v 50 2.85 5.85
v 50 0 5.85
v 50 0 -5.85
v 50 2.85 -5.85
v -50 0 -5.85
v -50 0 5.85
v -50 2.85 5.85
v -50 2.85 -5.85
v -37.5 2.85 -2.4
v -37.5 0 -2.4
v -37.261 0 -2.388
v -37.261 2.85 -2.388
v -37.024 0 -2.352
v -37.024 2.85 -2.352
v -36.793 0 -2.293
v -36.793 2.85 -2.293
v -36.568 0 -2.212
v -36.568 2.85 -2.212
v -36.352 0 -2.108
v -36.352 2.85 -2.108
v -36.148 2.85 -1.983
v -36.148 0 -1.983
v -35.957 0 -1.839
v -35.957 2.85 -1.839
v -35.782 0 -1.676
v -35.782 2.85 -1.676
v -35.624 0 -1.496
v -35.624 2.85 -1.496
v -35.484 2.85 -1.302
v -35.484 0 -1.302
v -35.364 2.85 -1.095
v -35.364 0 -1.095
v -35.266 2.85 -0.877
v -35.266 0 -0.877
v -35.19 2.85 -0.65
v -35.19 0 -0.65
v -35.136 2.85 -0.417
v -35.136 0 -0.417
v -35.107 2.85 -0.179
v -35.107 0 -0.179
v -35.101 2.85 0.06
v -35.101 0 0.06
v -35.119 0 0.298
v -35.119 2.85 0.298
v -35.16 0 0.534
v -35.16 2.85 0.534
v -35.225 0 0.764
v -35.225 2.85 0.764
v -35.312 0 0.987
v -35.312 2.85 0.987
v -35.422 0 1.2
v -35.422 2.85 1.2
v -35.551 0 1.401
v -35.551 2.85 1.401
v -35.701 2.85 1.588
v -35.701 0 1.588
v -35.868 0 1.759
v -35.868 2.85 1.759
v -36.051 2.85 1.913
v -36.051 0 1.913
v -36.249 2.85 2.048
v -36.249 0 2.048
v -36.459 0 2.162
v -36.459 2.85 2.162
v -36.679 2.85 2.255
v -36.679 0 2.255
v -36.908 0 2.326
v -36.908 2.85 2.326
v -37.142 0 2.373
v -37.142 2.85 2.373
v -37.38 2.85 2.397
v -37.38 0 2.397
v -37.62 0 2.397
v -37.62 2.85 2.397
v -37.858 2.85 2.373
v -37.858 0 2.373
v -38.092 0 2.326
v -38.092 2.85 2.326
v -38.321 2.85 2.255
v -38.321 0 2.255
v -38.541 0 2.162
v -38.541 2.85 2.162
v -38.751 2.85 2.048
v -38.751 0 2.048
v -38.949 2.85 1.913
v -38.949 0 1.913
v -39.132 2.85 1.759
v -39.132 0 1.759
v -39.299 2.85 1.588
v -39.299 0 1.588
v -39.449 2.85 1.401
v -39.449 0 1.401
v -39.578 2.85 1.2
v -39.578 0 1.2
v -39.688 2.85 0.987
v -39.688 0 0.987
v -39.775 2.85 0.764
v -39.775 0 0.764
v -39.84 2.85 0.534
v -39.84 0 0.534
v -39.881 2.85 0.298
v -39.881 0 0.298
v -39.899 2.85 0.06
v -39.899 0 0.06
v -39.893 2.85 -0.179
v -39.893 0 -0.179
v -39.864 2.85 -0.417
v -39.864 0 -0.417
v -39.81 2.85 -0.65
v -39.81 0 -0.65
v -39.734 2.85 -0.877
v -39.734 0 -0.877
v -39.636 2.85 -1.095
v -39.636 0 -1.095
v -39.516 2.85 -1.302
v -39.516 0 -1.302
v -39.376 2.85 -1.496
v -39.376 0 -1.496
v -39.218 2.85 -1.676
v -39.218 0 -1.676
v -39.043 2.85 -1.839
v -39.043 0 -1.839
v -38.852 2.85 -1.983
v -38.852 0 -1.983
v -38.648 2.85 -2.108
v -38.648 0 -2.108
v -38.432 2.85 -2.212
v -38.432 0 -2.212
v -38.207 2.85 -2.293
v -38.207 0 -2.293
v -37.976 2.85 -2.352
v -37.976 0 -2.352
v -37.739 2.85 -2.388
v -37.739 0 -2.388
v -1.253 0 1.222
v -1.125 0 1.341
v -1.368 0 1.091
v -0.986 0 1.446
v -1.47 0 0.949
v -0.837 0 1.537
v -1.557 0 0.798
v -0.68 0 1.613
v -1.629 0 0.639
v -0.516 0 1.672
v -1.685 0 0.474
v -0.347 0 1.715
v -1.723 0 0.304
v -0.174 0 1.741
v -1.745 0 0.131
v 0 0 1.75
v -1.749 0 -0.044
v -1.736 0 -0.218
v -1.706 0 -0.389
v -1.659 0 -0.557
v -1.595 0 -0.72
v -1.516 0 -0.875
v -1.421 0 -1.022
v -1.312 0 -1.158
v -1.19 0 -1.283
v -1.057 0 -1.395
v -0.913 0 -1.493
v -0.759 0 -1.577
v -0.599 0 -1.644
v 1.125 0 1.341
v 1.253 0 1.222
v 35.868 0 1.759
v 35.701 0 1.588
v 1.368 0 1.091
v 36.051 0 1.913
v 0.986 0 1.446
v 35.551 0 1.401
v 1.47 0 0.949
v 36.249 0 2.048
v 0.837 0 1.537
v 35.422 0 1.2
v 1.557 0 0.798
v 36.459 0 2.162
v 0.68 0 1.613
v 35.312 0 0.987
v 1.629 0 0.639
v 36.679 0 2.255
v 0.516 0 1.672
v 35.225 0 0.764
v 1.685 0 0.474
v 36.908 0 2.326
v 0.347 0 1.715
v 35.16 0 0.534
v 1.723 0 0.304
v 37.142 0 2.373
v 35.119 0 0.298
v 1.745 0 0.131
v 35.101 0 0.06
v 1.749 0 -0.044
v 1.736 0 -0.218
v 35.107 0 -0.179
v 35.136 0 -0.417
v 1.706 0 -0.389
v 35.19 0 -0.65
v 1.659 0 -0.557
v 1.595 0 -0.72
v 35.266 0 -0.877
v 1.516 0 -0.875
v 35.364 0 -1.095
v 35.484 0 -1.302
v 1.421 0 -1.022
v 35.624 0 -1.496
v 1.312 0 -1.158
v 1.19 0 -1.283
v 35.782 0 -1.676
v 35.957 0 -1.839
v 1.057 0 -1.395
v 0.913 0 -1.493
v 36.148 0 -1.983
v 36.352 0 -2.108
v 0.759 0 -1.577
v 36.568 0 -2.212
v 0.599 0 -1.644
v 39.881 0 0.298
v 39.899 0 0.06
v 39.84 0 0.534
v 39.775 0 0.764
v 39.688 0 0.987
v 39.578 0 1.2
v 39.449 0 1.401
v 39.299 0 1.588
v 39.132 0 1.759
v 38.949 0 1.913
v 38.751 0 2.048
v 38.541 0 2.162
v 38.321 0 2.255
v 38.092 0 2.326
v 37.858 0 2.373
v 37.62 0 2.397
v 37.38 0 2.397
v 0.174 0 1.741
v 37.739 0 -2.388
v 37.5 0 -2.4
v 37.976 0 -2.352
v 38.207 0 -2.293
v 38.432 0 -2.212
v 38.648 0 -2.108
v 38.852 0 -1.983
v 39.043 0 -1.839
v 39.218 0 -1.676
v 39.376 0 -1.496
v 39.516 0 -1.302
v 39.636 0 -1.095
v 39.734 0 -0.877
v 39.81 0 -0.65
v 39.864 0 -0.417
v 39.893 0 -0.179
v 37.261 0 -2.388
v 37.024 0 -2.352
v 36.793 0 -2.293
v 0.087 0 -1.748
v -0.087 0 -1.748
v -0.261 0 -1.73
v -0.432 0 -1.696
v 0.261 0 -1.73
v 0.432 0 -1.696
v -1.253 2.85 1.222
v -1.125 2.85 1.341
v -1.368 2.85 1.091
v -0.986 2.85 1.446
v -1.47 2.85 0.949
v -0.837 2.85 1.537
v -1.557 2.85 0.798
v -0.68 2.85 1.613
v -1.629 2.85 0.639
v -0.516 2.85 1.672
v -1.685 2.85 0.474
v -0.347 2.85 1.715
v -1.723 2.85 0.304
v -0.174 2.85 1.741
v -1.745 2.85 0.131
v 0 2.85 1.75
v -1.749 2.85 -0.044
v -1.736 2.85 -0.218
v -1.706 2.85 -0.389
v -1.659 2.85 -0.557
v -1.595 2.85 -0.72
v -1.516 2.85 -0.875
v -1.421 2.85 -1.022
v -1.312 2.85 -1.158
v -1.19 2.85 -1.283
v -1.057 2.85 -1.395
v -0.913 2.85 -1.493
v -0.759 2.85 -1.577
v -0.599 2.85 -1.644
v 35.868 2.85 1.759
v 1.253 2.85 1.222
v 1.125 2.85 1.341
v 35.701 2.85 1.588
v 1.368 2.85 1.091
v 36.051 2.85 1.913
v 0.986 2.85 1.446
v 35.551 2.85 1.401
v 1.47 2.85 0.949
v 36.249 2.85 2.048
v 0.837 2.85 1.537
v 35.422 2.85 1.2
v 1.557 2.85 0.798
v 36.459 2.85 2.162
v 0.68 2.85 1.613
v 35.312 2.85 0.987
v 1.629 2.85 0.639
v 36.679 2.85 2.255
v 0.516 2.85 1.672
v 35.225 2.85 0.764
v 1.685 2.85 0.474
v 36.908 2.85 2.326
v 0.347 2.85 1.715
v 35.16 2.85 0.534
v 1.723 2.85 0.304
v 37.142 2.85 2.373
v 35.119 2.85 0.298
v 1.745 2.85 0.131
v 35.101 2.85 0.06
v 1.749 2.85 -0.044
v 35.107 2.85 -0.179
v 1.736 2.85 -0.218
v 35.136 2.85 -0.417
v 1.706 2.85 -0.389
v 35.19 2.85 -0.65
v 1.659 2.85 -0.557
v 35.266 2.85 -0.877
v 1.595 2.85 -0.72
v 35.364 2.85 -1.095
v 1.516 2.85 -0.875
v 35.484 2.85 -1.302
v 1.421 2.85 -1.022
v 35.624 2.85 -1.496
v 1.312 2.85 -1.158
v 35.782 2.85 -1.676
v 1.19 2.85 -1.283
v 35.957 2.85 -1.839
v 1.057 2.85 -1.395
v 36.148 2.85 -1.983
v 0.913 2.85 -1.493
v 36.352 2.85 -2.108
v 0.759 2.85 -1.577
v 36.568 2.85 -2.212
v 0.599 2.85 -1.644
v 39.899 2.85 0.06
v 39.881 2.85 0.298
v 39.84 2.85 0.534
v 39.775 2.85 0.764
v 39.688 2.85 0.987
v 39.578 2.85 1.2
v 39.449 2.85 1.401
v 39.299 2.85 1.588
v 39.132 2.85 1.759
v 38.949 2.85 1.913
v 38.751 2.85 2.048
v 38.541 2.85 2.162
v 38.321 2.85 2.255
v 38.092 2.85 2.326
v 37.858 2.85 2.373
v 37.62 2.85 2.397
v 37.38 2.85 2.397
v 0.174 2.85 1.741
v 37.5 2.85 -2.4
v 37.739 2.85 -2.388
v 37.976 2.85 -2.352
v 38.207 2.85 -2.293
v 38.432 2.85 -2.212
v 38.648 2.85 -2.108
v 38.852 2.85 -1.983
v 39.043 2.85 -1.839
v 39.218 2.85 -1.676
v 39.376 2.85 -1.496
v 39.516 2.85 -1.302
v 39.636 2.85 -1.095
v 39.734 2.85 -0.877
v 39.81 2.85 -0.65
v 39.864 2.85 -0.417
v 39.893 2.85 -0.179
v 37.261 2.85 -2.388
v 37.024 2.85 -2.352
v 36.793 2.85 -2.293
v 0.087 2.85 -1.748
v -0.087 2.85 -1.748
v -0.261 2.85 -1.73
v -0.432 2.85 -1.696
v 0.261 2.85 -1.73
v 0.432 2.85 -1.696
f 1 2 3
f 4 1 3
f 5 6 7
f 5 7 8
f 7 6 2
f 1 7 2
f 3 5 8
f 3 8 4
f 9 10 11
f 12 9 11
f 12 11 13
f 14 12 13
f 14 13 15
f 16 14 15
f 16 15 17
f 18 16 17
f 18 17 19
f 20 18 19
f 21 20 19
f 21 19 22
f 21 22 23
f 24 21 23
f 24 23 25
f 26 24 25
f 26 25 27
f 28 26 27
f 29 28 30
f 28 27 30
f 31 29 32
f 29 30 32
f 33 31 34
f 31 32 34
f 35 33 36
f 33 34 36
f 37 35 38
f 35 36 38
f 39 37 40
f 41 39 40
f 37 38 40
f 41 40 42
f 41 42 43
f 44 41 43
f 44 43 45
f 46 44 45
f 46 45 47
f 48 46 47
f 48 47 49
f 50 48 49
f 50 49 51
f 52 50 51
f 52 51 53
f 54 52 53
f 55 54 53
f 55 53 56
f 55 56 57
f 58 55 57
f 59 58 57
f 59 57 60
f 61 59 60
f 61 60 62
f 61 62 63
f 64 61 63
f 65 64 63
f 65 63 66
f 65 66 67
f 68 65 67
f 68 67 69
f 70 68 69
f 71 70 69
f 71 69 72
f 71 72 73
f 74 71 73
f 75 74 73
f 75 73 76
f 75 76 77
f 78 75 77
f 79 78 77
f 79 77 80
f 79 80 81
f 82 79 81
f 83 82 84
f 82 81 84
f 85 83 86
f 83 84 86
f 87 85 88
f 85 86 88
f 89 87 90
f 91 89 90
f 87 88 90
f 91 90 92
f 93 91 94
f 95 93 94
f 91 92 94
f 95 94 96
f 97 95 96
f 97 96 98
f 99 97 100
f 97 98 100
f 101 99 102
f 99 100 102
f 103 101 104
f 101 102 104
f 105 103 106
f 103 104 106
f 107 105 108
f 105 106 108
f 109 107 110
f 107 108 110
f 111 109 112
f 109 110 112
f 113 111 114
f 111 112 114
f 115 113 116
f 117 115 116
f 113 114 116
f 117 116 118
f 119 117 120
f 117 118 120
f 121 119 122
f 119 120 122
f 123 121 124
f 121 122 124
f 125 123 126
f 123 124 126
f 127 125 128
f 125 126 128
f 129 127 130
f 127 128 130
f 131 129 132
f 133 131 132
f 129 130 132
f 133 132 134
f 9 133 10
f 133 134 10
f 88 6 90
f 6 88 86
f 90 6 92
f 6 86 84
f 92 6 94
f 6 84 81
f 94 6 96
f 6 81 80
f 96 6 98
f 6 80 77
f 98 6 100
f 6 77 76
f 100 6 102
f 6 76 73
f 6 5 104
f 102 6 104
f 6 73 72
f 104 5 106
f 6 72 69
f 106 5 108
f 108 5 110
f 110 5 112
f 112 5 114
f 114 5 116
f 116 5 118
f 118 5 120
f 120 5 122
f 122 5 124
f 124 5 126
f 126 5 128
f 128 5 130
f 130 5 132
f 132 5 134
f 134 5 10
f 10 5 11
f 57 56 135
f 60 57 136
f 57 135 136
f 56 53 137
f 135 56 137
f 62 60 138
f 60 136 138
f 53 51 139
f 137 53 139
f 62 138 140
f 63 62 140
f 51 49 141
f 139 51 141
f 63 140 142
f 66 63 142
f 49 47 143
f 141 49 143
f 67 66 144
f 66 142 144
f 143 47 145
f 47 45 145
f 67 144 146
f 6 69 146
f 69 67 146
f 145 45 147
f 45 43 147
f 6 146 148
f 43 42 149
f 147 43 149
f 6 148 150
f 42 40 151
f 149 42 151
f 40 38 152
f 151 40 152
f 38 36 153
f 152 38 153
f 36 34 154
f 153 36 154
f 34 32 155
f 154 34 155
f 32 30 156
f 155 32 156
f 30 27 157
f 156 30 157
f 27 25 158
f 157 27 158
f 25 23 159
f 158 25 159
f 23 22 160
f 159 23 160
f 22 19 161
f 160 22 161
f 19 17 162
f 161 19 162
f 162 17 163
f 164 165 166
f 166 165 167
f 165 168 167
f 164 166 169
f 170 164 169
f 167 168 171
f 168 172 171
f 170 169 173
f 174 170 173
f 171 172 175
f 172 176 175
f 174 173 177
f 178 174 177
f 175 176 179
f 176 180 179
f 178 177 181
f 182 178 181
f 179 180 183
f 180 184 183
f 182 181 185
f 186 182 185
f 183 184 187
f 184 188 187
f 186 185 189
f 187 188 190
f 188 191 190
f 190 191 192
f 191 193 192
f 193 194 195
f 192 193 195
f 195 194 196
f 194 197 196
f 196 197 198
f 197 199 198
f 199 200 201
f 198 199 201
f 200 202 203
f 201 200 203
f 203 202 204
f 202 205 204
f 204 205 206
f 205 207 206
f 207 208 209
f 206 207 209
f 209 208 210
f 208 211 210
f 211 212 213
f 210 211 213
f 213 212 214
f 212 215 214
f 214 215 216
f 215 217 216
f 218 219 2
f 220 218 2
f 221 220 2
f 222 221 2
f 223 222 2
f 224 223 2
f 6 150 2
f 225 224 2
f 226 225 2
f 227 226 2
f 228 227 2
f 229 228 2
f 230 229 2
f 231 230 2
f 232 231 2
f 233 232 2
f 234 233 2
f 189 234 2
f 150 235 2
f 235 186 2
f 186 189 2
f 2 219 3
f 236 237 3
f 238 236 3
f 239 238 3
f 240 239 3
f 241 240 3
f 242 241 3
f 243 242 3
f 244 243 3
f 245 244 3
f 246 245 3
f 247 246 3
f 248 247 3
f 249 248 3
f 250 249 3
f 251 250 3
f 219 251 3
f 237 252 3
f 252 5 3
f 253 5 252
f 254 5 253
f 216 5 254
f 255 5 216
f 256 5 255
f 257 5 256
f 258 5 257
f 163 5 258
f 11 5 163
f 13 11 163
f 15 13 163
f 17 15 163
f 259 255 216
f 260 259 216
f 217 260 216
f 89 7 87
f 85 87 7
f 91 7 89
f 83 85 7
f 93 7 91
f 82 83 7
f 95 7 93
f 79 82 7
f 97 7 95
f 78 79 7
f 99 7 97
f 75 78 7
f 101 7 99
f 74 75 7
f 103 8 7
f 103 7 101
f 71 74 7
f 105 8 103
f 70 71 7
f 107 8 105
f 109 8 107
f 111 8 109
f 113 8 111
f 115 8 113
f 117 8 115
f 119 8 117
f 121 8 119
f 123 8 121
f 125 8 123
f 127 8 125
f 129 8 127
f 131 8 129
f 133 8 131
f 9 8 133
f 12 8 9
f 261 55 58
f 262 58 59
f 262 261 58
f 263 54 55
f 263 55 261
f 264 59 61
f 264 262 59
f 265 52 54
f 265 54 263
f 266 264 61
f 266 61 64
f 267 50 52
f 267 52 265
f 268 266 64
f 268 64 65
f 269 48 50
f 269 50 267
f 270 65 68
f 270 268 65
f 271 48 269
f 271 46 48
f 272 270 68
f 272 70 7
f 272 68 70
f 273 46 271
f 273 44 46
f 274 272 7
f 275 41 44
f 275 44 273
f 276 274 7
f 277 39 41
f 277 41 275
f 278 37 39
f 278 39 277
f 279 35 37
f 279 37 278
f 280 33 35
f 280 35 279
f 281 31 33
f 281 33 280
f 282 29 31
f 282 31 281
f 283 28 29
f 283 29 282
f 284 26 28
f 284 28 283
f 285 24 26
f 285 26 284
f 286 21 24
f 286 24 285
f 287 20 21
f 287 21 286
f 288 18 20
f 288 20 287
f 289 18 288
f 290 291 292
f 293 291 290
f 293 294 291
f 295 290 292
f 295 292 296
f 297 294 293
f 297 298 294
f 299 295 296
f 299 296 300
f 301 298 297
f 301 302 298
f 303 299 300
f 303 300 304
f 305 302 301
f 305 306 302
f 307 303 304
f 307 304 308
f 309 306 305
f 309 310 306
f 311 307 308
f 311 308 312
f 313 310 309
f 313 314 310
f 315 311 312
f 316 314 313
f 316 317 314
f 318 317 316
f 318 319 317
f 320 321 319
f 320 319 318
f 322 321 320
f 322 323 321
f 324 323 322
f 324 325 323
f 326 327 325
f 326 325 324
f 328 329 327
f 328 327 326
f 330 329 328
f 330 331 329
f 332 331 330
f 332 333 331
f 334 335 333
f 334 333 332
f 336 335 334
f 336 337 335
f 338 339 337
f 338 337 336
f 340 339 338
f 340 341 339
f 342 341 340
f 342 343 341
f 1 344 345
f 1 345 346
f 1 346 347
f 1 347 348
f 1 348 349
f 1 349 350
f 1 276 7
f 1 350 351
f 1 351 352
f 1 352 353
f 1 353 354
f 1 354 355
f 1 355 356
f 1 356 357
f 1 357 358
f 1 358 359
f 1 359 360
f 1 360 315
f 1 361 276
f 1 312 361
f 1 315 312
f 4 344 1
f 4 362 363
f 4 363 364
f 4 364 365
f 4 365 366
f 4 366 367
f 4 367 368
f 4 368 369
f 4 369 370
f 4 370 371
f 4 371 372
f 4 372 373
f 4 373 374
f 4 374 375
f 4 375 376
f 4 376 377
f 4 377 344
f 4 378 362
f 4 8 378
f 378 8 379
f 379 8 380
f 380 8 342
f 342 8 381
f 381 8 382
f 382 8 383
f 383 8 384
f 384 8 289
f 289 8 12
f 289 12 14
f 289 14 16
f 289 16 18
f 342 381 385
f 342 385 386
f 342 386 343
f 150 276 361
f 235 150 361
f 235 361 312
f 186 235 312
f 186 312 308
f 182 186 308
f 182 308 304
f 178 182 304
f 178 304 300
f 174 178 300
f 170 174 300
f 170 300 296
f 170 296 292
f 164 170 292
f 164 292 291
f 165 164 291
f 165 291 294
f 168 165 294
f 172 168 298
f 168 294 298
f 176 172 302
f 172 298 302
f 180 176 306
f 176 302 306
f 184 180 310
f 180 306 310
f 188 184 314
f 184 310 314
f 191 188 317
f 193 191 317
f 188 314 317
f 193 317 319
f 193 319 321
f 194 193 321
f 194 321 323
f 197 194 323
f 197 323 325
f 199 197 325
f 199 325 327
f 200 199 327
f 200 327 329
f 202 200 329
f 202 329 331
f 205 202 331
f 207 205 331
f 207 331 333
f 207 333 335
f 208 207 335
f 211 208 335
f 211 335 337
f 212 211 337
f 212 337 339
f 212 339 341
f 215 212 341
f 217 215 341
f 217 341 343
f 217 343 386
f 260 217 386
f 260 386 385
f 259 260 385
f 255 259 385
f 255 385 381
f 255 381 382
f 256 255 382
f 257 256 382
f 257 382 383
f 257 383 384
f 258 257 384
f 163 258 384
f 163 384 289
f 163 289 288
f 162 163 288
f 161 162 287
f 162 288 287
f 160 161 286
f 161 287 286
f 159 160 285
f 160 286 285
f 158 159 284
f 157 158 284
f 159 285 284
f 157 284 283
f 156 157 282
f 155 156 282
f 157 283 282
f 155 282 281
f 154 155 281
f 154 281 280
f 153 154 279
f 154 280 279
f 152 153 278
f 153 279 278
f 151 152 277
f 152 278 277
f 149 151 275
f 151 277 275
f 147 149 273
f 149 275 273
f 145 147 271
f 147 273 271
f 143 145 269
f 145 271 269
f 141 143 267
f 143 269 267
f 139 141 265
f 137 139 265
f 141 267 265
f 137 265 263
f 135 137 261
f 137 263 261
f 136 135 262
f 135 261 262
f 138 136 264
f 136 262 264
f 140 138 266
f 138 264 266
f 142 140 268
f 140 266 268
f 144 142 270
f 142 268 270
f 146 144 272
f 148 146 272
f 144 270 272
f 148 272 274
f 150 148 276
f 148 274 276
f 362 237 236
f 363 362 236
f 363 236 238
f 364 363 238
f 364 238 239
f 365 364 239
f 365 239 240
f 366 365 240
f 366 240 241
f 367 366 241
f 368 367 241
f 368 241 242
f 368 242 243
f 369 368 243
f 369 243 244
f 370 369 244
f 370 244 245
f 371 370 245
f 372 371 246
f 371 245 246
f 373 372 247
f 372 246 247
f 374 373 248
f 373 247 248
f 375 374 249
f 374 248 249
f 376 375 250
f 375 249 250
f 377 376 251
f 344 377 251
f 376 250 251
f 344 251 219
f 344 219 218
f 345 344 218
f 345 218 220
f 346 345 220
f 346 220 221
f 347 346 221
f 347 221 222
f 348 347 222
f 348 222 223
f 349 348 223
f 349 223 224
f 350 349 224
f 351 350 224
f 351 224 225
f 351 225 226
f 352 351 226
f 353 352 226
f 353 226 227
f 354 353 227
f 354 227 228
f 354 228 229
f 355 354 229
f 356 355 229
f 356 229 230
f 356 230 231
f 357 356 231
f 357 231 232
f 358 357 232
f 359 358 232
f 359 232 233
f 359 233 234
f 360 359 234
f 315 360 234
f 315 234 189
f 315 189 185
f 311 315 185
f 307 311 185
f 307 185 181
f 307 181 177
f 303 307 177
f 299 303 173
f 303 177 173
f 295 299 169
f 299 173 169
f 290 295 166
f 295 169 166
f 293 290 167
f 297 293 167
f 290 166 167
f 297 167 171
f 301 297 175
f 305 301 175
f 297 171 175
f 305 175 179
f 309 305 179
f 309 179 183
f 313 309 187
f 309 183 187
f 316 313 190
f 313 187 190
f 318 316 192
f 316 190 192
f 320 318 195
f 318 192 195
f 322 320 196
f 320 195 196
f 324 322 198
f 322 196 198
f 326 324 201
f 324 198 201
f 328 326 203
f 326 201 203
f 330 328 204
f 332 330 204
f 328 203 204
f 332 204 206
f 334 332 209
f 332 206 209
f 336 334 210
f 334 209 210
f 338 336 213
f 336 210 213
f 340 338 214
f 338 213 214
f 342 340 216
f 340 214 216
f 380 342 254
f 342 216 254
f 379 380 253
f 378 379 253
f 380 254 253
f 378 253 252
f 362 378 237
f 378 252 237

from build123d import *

# Parameters (mm, degrees)
SKETCH1_W           = 100
SKETCH1_H           = 11.7
BOSS_EXTRUDE1_DEPTH = 2.85
SKETCH2_R           = 1.75
CUT_EXTRUDE3_DEPTH  = 51.421671928
SKETCH3_R           = 2.4
CUT_EXTRUDE4_DEPTH  = 51.662732852


with BuildPart() as part:
    # Sketch1 → Boss-Extrude1 (new body)
    with BuildSketch(Plane(origin=(0, 0, 0), x_dir=(1, 0, 0), z_dir=(0, 1, 0))):
        Rectangle(SKETCH1_W, SKETCH1_H)
    extrude(amount=BOSS_EXTRUDE1_DEPTH)

    # Sketch2 → Cut-Extrude3 (cut, through all)
    with BuildSketch(Plane(origin=(0, 2.85, 0), x_dir=(1, 0, 0), z_dir=(0, 1, 0))):
        with Locations(Location((0, 0, 0), (0, 0, 270))):
            Circle(SKETCH2_R)
    extrude(amount=-CUT_EXTRUDE3_DEPTH, mode=Mode.SUBTRACT)

    # Sketch3 → Cut-Extrude4 (cut, through all)
    with BuildSketch(Plane.XZ.offset(2.85)):
        with Locations(Location((-37.5, 0, 0), (0, 0, 270))):
            Circle(SKETCH3_R)
        with Locations(Location((37.5, 0, 0), (0, 0, 270))):
            Circle(SKETCH3_R)
    extrude(amount=-CUT_EXTRUDE4_DEPTH, mode=Mode.SUBTRACT)


solid = part.part
